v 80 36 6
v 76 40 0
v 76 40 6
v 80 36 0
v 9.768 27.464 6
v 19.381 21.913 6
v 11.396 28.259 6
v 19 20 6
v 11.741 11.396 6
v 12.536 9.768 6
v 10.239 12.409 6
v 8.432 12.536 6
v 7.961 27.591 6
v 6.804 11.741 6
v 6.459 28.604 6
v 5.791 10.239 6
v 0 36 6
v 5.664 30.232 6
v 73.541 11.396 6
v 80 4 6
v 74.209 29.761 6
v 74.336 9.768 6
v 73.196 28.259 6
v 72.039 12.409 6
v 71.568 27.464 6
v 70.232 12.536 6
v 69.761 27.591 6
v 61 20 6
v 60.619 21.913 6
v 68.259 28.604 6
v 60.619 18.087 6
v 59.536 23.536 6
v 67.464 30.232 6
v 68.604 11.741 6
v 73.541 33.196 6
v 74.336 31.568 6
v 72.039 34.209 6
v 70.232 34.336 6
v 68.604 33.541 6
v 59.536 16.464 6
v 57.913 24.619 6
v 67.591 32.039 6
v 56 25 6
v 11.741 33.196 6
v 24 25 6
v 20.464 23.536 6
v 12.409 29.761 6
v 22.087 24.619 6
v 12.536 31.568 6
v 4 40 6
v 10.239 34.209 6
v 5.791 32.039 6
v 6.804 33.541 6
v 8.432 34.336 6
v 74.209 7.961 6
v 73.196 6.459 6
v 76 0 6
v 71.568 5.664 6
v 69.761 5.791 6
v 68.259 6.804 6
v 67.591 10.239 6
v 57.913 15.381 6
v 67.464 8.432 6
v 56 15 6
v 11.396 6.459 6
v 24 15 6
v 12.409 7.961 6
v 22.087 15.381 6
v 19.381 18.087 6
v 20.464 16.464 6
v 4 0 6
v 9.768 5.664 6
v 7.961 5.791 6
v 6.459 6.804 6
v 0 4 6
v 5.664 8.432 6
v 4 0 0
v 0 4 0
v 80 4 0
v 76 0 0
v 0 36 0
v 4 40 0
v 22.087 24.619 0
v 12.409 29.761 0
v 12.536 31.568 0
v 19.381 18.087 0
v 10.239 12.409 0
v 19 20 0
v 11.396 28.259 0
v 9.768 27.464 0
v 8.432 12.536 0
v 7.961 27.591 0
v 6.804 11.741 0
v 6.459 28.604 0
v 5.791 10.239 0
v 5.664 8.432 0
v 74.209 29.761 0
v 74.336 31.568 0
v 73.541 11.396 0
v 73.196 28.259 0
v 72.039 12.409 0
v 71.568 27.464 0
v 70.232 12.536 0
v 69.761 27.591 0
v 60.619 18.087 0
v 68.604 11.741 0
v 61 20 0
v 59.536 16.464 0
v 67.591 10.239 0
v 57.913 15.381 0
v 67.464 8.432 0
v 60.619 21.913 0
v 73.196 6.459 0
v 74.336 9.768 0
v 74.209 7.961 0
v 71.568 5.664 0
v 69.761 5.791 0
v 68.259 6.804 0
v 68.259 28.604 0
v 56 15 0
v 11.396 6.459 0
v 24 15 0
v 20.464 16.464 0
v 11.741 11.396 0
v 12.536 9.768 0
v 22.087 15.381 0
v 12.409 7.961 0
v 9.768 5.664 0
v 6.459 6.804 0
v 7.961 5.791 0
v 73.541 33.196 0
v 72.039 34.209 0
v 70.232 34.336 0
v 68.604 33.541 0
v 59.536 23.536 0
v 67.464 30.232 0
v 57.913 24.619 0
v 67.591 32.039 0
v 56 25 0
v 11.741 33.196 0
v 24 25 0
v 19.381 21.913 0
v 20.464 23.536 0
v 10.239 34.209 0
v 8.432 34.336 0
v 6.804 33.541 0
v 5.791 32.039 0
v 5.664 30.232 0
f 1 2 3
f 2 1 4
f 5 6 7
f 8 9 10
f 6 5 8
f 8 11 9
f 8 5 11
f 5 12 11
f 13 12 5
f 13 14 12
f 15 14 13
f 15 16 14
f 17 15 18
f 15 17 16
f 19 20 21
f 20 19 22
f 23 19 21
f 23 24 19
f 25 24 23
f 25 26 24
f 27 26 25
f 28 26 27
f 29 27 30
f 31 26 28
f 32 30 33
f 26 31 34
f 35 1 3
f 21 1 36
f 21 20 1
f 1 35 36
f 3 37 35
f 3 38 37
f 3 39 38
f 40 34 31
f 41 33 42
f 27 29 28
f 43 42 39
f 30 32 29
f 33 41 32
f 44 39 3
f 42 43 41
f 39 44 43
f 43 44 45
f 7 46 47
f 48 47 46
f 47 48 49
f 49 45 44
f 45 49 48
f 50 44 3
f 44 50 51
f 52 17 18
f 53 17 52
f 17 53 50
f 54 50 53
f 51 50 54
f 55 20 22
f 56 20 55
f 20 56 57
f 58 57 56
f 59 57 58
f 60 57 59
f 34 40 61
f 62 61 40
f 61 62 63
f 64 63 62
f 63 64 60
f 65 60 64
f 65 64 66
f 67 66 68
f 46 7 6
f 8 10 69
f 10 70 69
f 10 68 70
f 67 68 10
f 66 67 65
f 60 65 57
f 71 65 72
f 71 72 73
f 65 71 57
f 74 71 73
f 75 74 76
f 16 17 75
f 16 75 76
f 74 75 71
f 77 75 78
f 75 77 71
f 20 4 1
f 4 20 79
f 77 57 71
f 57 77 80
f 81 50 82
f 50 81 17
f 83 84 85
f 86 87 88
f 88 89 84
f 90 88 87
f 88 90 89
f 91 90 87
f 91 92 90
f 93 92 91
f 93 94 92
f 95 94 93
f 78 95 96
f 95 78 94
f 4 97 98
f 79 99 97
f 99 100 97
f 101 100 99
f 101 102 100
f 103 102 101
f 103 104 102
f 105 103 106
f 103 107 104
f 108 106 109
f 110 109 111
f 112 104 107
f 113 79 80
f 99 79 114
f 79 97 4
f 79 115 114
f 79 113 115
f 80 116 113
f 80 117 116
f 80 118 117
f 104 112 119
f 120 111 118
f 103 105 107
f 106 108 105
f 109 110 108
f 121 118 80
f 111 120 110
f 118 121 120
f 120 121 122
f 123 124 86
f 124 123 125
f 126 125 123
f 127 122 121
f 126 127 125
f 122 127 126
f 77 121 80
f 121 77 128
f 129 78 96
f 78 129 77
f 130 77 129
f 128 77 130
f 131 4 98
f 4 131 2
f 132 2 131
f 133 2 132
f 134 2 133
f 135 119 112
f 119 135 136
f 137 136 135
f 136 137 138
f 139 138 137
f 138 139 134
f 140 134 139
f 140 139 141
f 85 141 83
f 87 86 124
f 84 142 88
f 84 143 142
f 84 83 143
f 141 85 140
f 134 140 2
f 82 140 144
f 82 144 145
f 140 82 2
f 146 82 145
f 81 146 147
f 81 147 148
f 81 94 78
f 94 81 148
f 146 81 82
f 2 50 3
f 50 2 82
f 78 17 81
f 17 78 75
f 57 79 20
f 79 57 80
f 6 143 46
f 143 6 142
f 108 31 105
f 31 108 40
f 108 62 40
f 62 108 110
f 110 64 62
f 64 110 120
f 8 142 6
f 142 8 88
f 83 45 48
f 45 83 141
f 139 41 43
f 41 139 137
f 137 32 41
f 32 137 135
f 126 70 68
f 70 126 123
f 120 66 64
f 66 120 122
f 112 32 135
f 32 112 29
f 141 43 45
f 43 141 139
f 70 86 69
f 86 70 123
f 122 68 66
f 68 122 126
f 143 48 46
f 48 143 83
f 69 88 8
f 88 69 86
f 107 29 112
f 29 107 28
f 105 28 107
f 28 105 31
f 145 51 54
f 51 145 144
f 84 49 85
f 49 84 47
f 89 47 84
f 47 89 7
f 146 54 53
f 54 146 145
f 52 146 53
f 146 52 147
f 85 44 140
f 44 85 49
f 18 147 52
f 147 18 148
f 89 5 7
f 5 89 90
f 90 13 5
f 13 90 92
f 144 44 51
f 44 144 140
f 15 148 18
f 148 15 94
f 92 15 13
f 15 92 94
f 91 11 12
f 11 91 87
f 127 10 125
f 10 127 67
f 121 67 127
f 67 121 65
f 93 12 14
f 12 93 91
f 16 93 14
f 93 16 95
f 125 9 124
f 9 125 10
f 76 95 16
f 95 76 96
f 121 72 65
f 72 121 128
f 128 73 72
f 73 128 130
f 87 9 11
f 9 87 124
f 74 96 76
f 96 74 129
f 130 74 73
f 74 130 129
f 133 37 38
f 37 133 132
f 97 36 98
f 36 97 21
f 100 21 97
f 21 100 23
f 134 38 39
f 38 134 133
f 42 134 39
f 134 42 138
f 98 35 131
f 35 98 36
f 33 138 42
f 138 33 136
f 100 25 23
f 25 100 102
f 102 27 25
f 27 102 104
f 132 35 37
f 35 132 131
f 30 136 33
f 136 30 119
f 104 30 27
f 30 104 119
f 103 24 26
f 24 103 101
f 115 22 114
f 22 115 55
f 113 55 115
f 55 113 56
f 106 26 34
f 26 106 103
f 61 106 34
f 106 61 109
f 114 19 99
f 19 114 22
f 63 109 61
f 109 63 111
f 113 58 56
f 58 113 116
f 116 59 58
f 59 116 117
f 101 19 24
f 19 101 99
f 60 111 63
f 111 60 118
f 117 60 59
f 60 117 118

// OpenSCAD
$fn = 32;

// ----------------------------------------------------------------------
// Bracket plate: slot plate 80 x 40
// ----------------------------------------------------------------------

// --- parameters (mm) ---
hole_r = 3.5;             // bolt hole radius
plate_t = 6;              // plate thickness, Z (extrusion height)
plate_l = 80;             // plate length
plate_w = 40;             // plate width
slot_l = 32;              // slot straight length
slot_r = 5;               // slot end radius

slot_len = slot_l + 2 * slot_r;
slot_w = 2 * slot_r;
hole_d2 = 2 * hole_r;

profile = [[4, 0], [76, 0], [80, 4], [80, 36], [76, 40], [4, 40], [0, 36], [0, 4]];  // primary outline, 8 points, counter clockwise
void_1 = [[56, 15], [57.913, 15.381], [59.536, 16.464], [60.619, 18.087], [61, 20], [60.619, 21.913], [59.536, 23.536], [57.913, 24.619], [56, 25], [24, 25], [22.087, 24.619], [20.464, 23.536], [19.381, 21.913], [19, 20], [19.381, 18.087], [20.464, 16.464], [22.087, 15.381], [24, 15]];  // grip slot, 18 points
void_2 = [[12.536, 31.568], [11.741, 33.196], [10.239, 34.209], [8.432, 34.336], [6.804, 33.541], [5.791, 32.039], [5.664, 30.232], [6.459, 28.604], [7.961, 27.591], [9.768, 27.464], [11.396, 28.259], [12.409, 29.761]];  // corner hole, 12 points
void_3 = [[12.536, 9.768], [11.741, 11.396], [10.239, 12.409], [8.432, 12.536], [6.804, 11.741], [5.791, 10.239], [5.664, 8.432], [6.459, 6.804], [7.961, 5.791], [9.768, 5.664], [11.396, 6.459], [12.409, 7.961]];  // corner hole, 12 points
void_4 = [[74.336, 31.568], [73.541, 33.196], [72.039, 34.209], [70.232, 34.336], [68.604, 33.541], [67.591, 32.039], [67.464, 30.232], [68.259, 28.604], [69.761, 27.591], [71.568, 27.464], [73.196, 28.259], [74.209, 29.761]];  // corner hole, 12 points
void_5 = [[74.336, 9.768], [73.541, 11.396], [72.039, 12.409], [70.232, 12.536], [68.604, 11.741], [67.591, 10.239], [67.464, 8.432], [68.259, 6.804], [69.761, 5.791], [71.568, 5.664], [73.196, 6.459], [74.209, 7.961]];  // corner hole, 12 points

// --- the one profile operation ---
difference() {
  linear_extrude(height = plate_t) polygon(points = profile);
  translate([0, 0, -1])
    linear_extrude(height = plate_t + 2) polygon(points = void_1);
  translate([0, 0, -1])
    linear_extrude(height = plate_t + 2) polygon(points = void_2);
  translate([0, 0, -1])
    linear_extrude(height = plate_t + 2) polygon(points = void_3);
  translate([0, 0, -1])
    linear_extrude(height = plate_t + 2) polygon(points = void_4);
  translate([0, 0, -1])
    linear_extrude(height = plate_t + 2) polygon(points = void_5);
}
